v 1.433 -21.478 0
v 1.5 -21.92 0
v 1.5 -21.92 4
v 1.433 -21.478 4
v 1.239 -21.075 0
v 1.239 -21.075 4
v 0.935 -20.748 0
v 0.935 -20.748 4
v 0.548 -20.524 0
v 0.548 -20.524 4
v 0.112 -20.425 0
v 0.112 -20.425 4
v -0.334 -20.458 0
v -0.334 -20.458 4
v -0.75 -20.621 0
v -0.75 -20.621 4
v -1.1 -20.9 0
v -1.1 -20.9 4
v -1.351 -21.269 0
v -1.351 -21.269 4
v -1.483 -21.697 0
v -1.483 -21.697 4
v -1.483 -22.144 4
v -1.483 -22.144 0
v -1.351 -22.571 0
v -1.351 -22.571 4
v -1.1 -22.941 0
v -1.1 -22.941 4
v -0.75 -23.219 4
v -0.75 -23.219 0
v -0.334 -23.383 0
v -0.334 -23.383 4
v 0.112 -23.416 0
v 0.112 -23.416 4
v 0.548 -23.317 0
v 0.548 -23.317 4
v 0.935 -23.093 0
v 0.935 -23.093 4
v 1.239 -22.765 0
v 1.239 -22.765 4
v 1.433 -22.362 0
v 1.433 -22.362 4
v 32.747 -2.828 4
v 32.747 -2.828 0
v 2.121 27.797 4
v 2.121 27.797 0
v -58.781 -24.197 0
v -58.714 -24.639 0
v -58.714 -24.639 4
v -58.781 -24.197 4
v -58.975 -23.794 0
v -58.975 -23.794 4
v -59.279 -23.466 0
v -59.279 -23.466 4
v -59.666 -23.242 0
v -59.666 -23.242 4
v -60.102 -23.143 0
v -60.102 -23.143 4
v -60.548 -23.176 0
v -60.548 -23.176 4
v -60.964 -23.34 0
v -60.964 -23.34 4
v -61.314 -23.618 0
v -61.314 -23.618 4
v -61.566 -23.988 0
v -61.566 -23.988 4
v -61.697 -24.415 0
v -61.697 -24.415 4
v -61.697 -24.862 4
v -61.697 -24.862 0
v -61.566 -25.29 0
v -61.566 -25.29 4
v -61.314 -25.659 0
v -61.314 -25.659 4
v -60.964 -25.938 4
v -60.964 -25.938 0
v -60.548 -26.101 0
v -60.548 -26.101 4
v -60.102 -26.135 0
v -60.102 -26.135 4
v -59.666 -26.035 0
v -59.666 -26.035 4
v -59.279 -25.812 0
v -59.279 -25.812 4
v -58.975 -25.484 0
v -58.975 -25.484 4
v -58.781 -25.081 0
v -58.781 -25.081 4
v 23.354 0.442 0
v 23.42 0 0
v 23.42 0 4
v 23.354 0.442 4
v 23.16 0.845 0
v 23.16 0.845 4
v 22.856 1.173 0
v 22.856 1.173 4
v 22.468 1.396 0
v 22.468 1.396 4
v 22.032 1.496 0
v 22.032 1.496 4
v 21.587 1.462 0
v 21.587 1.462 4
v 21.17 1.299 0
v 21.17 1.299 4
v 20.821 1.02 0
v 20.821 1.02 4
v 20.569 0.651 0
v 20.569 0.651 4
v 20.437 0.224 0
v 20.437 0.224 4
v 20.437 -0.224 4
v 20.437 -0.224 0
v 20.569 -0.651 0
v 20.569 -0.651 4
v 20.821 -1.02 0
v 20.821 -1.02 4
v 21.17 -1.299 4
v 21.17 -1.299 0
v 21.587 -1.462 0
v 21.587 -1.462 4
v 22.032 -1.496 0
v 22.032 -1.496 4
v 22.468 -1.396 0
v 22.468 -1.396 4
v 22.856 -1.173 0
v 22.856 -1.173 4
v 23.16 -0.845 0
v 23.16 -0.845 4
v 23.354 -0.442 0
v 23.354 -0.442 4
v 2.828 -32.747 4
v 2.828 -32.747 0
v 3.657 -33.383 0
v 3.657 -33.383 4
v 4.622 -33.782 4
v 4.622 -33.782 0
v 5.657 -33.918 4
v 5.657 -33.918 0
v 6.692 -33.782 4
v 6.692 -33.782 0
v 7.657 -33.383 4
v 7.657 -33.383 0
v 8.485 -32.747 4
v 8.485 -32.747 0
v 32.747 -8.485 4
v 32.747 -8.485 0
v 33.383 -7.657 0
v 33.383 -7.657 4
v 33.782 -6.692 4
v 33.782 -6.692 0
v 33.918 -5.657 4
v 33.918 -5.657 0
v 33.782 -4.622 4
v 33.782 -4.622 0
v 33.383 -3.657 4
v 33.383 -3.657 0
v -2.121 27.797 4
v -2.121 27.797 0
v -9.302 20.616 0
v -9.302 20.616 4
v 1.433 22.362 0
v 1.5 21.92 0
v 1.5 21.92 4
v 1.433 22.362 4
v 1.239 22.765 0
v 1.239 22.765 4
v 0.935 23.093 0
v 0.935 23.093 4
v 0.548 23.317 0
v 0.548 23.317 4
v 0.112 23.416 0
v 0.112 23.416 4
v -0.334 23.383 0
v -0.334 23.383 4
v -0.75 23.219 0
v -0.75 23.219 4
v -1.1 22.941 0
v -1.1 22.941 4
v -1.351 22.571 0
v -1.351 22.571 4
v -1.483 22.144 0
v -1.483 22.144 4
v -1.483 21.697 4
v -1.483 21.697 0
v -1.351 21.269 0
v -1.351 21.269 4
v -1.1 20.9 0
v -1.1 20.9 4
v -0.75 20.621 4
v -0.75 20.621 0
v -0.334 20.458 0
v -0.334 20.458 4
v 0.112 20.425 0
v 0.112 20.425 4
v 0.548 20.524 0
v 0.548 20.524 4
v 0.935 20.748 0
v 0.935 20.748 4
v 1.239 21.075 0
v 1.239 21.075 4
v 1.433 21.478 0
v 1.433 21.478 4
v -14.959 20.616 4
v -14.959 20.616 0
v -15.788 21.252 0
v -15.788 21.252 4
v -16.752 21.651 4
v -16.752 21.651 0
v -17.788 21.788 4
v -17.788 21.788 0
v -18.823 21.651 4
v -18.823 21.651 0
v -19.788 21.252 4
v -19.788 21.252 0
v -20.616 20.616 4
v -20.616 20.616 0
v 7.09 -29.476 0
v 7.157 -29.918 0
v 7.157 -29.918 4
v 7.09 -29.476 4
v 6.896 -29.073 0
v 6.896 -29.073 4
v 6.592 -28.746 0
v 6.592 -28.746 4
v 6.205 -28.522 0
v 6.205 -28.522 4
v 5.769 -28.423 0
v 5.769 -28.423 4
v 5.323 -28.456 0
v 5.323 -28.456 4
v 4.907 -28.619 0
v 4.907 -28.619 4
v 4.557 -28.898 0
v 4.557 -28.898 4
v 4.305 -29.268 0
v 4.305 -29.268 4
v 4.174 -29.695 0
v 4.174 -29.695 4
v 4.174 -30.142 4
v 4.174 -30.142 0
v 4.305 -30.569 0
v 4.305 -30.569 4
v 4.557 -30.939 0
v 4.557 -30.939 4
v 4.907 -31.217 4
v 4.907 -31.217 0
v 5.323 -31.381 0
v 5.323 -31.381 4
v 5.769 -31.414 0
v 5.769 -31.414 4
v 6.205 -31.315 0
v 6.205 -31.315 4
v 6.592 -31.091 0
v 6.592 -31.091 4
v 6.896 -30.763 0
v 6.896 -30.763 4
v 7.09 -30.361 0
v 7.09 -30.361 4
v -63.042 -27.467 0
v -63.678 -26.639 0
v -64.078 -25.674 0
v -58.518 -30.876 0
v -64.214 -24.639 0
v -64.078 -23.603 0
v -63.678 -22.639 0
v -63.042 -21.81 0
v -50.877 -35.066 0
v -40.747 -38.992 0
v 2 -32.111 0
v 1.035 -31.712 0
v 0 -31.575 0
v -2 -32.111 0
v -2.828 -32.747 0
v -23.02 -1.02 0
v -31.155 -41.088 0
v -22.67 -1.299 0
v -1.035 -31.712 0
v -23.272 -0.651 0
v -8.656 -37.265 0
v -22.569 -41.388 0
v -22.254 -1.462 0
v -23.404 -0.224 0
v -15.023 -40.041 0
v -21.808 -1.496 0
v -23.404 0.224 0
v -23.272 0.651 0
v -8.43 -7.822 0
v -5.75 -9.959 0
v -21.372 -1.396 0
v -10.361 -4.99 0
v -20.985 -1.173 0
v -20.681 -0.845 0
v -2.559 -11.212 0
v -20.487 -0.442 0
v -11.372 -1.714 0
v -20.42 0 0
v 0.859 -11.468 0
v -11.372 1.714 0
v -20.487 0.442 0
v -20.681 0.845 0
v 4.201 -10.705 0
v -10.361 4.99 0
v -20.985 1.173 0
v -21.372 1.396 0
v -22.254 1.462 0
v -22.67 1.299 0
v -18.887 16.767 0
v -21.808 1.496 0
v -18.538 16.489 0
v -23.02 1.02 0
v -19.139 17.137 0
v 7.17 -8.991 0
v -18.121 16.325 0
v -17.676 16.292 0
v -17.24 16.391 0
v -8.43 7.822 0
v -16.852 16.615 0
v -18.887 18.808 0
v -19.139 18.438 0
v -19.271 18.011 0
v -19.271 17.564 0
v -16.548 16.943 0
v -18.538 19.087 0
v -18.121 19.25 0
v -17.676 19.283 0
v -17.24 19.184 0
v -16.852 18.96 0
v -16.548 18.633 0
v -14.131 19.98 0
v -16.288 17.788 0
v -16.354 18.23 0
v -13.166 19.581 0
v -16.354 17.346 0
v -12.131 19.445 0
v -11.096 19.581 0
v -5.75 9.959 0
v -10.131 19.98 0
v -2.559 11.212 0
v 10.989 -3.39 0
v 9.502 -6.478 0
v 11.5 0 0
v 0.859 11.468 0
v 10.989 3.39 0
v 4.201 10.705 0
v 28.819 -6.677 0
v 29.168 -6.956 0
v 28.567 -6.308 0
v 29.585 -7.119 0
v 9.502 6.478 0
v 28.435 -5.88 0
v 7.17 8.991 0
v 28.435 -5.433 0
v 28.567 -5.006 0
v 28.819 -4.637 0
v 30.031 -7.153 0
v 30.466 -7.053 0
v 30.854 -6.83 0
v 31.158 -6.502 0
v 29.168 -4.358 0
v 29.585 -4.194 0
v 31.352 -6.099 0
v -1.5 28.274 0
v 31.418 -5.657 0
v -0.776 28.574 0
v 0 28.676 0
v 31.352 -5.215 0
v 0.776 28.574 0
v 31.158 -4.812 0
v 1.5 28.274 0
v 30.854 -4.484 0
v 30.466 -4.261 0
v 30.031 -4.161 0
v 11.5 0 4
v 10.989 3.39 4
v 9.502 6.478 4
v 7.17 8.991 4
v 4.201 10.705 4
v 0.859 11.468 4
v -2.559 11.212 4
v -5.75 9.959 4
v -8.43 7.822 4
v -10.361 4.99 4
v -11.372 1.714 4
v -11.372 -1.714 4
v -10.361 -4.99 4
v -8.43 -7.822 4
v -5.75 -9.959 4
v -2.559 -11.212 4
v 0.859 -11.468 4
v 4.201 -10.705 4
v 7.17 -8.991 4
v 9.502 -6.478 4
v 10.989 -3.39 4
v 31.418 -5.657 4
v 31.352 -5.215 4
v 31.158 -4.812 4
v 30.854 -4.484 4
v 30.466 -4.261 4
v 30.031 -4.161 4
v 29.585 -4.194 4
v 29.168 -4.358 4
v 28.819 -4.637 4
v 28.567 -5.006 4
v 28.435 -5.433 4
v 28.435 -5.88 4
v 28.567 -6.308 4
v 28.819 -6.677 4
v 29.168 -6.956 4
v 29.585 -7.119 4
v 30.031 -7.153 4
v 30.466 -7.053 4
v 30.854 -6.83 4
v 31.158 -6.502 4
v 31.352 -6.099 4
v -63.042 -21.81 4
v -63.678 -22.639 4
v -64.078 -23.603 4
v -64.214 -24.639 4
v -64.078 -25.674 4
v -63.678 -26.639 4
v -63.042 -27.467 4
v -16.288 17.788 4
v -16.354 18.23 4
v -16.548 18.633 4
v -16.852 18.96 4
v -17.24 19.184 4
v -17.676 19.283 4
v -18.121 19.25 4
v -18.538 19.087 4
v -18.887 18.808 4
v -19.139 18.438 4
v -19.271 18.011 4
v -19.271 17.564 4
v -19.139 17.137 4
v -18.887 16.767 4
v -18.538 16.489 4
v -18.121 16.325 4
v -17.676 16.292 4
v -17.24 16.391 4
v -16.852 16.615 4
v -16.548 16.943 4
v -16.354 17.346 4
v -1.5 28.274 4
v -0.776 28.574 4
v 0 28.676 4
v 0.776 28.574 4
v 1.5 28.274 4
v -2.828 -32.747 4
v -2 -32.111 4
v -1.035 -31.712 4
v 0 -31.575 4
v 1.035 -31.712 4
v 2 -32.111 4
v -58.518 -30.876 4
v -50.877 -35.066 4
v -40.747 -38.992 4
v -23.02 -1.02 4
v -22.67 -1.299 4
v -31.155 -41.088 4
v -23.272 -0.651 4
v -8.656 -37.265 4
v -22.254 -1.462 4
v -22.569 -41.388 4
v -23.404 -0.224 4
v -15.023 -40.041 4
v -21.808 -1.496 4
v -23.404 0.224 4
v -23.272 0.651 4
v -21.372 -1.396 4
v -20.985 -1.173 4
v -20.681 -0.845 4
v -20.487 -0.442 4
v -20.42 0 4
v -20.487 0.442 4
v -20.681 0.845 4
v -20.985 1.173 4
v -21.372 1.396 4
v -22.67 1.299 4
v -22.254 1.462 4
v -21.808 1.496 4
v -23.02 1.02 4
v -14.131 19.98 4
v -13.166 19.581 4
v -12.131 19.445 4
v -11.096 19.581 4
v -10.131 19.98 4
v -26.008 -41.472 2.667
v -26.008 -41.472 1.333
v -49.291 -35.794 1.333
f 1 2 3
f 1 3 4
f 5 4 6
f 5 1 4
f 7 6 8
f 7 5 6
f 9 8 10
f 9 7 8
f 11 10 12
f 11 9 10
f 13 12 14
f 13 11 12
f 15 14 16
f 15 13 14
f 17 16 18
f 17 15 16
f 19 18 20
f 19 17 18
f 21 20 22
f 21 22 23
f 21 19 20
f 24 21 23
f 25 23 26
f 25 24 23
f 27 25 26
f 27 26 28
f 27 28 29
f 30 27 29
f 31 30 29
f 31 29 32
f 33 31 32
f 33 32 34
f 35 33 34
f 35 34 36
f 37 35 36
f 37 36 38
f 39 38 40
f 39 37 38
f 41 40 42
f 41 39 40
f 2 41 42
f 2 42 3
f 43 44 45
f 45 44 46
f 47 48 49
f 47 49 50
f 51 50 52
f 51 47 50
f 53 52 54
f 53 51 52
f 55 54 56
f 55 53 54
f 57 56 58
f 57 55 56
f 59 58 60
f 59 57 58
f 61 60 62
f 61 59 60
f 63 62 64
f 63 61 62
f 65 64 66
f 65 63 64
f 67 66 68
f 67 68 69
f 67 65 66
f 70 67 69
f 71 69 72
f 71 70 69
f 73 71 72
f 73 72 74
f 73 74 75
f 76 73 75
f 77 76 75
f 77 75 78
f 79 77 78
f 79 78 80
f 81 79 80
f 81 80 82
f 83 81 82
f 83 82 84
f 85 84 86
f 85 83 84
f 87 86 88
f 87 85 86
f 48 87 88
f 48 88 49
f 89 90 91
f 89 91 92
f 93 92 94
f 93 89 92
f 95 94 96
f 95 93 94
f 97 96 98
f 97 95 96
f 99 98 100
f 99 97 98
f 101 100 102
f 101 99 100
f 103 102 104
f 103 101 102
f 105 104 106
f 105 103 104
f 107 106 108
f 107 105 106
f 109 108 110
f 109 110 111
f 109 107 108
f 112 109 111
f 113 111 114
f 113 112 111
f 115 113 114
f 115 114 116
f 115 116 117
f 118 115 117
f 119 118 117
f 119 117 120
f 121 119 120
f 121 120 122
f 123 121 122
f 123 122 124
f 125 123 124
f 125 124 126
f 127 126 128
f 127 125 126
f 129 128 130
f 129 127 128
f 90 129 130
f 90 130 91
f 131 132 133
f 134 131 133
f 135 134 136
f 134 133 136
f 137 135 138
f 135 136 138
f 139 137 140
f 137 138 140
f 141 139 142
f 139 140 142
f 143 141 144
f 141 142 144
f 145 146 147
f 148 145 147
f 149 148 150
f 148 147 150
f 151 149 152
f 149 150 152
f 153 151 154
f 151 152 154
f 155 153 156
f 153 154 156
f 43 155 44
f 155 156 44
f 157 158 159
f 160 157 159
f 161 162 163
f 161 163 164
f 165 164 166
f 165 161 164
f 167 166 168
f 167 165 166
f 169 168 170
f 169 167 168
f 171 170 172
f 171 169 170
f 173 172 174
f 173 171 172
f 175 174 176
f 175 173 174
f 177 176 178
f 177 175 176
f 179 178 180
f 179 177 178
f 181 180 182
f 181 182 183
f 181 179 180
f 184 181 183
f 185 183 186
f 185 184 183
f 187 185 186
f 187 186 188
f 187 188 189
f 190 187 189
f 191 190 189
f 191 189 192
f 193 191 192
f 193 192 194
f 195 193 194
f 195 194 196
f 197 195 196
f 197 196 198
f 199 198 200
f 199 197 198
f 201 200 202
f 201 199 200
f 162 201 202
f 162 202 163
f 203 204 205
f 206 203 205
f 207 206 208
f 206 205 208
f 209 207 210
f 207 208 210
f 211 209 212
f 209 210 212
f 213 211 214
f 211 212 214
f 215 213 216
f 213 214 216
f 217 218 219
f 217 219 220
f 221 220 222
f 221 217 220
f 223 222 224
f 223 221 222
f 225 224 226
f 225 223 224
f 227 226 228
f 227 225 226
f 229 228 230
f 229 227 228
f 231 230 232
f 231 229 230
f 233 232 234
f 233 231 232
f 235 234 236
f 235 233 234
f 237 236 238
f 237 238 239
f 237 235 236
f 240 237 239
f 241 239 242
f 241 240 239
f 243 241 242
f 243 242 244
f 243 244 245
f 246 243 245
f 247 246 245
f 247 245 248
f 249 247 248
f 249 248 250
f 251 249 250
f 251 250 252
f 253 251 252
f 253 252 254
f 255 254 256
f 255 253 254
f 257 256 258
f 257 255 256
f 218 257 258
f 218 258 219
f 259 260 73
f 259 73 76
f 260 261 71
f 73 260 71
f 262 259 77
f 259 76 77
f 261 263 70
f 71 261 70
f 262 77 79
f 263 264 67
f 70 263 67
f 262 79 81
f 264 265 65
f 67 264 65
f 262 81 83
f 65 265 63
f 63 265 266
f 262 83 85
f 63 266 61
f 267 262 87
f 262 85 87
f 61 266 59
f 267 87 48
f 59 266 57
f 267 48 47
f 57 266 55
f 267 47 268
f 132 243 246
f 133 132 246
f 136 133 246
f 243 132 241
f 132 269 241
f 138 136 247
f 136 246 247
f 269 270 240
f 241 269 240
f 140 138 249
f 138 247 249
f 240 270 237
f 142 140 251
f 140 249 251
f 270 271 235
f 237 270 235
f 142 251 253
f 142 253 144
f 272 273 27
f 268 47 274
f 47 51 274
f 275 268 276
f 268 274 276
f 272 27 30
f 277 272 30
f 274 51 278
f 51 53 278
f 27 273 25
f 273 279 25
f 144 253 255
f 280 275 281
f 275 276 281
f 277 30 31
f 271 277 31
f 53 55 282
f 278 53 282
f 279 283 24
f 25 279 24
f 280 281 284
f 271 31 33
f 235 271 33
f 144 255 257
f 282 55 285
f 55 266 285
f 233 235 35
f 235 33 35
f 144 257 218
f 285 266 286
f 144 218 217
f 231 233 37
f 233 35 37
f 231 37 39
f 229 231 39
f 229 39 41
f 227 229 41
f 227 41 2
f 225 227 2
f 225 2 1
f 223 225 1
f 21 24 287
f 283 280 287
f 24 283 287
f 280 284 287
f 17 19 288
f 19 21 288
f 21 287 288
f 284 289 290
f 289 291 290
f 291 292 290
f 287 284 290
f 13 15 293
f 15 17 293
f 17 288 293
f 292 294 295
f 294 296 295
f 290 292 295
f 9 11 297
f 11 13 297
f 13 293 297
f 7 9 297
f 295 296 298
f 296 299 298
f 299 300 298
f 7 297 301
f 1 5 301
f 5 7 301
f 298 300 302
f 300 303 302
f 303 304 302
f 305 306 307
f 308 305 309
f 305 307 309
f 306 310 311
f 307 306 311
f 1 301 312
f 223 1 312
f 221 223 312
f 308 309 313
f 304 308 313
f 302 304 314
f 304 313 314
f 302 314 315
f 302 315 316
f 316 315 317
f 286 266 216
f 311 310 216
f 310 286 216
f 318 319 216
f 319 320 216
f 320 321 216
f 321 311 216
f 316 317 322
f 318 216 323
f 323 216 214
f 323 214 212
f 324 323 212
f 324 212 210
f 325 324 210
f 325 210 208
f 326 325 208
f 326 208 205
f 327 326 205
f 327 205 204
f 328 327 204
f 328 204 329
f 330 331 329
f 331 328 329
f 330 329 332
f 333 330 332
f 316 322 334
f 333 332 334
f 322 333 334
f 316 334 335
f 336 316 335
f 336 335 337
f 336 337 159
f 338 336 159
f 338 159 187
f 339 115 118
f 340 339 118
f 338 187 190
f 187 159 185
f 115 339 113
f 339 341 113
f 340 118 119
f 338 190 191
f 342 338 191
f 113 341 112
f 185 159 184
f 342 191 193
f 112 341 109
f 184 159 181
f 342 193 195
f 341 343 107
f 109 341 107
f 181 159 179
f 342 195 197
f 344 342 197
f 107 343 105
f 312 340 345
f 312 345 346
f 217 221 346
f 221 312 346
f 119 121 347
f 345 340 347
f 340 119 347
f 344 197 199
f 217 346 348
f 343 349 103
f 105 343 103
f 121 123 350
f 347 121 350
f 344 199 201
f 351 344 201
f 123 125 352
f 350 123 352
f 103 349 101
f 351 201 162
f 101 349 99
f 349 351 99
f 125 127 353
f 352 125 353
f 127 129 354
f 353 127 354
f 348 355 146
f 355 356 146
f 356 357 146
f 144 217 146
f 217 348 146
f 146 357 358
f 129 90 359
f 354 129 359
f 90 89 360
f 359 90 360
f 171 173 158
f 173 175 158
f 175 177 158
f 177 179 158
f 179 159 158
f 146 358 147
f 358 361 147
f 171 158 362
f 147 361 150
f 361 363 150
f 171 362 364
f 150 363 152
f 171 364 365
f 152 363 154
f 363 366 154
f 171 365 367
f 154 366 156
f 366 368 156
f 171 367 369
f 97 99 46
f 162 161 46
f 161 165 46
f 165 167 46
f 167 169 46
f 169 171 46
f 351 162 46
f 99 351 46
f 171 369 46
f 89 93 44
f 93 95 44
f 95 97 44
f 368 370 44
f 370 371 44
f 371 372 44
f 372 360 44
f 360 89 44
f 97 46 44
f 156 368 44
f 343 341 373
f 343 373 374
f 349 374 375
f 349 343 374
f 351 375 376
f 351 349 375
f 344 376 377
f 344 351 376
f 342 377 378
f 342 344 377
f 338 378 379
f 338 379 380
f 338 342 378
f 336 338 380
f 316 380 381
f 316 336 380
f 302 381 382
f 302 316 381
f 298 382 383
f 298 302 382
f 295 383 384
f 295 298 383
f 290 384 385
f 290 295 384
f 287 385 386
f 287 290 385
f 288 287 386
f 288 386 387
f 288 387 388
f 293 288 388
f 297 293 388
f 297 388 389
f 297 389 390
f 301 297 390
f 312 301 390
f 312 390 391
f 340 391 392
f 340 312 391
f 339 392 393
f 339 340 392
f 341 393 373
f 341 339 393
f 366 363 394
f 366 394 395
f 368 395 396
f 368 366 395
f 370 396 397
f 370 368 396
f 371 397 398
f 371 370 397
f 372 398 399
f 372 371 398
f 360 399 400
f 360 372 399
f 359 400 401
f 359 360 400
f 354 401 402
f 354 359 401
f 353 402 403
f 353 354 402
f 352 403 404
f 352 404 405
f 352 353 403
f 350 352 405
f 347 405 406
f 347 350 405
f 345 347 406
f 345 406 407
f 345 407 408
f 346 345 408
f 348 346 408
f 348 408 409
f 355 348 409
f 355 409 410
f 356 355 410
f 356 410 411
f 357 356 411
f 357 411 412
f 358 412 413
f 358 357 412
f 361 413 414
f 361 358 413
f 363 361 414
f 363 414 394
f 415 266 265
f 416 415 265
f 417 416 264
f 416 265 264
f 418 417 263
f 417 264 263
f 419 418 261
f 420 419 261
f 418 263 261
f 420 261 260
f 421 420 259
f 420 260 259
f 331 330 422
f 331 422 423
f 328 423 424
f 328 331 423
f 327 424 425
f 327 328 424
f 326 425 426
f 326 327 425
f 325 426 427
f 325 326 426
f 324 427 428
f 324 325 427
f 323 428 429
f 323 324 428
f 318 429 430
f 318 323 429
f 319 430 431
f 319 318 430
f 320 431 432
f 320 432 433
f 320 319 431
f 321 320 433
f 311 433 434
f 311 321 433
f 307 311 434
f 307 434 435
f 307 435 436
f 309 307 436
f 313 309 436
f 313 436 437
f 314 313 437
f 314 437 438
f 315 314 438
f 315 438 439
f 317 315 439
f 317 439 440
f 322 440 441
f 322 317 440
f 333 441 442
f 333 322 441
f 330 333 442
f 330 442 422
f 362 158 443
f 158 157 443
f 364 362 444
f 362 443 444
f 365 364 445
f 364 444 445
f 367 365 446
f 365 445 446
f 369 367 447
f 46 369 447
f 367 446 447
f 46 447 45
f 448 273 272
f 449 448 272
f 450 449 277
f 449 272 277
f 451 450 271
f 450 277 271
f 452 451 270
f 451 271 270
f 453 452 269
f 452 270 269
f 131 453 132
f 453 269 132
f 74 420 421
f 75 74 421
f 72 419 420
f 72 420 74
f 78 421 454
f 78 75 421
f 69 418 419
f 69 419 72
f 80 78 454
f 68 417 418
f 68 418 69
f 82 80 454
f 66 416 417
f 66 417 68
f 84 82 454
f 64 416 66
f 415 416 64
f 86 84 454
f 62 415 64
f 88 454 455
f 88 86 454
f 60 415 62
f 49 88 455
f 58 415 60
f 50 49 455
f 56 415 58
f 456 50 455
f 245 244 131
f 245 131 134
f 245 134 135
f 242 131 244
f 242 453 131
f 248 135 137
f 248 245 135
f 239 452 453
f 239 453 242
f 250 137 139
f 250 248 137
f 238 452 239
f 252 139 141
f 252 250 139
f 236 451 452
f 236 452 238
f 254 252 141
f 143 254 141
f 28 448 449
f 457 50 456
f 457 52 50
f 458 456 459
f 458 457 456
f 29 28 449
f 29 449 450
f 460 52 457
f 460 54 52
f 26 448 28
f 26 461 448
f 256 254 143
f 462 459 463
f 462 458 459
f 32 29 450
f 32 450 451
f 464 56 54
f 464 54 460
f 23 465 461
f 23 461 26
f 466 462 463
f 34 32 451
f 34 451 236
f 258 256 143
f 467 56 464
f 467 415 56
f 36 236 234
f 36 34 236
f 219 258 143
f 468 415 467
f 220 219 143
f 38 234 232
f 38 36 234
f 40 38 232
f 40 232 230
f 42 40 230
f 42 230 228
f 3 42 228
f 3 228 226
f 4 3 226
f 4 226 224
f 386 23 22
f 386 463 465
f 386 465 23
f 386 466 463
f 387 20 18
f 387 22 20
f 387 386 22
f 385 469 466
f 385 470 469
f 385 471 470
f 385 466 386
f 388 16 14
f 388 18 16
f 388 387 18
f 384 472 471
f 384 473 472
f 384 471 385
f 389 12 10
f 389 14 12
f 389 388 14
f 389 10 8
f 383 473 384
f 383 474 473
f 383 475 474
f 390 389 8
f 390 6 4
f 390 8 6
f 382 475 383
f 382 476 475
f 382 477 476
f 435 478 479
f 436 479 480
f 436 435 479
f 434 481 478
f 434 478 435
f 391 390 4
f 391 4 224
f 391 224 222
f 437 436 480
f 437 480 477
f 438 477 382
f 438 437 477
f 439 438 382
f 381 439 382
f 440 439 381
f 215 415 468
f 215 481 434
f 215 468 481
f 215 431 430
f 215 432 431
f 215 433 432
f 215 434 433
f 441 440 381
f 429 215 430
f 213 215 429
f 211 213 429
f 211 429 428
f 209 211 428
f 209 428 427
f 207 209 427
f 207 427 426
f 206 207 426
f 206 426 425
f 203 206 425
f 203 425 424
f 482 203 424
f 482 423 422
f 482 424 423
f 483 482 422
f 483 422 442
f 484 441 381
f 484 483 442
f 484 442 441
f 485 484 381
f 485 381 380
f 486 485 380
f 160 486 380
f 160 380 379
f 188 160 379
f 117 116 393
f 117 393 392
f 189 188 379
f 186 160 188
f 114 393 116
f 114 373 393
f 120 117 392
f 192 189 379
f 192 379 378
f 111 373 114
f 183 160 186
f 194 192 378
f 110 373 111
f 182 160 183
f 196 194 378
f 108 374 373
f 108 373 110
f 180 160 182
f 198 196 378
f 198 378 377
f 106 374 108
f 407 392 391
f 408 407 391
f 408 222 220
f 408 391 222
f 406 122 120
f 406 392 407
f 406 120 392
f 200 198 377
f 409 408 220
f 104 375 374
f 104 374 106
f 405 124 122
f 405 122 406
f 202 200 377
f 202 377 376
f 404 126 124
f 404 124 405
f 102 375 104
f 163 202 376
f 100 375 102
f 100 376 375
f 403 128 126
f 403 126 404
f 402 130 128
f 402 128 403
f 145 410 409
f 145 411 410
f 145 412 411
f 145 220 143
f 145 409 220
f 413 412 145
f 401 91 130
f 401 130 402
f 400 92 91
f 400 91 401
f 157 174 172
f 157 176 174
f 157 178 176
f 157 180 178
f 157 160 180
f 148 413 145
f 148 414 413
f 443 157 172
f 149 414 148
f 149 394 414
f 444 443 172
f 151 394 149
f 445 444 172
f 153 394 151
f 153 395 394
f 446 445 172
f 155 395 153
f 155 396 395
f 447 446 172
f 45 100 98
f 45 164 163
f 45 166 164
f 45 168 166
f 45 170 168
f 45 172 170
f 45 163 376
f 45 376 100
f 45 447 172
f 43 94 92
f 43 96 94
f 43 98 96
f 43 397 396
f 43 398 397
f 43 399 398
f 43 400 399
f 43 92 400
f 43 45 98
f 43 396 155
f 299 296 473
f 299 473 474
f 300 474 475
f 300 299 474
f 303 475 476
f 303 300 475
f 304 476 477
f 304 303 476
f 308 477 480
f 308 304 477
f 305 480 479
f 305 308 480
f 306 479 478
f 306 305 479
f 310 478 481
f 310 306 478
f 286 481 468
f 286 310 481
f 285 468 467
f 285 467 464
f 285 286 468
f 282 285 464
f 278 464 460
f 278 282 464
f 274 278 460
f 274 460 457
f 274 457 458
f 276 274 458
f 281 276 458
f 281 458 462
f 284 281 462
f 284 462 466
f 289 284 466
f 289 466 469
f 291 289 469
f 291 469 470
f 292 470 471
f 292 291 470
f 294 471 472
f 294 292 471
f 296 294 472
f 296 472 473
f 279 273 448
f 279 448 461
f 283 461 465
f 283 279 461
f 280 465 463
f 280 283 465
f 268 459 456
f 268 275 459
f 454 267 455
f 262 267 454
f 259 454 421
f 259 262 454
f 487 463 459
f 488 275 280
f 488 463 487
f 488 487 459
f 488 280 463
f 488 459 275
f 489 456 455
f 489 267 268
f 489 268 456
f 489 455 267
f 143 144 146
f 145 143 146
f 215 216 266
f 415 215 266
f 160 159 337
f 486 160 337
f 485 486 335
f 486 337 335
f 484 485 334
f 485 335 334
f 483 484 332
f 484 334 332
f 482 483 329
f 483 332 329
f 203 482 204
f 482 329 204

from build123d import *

# Parameters (mm, degrees)
SKETCH1_R           = 1.5
SKETCH1_R_2         = 11.5
BOSS_EXTRUDE1_DEPTH = 4
FILLET1_R           = 3


with BuildPart() as part:
    # Sketch1 → Boss-Extrude1 (new body)
    with BuildSketch(Plane.XY):
        with BuildLine():
            Line((-20.616075737, 20.616075737), (-63.042482608, -21.810331134))
            ThreePointArc((-63.042482608, -21.810331134), (-64.214055483, -24.638758259), (-63.042482608, -27.467185384))
            add(Edge.make_bspline(
                [(-2.828427125, -32.7468701), (-22.744659396, -52.590484488), (-57.268164388, -33.201805253), (-63.042482608, -27.467185384)],
                knots=[0, 0, 0, 0, 1, 1, 1, 1], degree=3))
            ThreePointArc((-2.828427125, -32.7468701), (0, -31.575297224), (2.828427125, -32.7468701))
            ThreePointArc((2.828427125, -32.7468701), (5.656854249, -33.918442975), (8.485281374, -32.7468701))
            Line((8.485281374, -32.7468701), (32.7468701, -8.485281374))
            ThreePointArc((32.7468701, -8.485281374), (33.918442975, -5.656854249), (32.7468701, -2.828427125))
            Line((32.7468701, -2.828427125), (0, 29.918442975))
            Line((0, 29.918442975), (-9.302367238, 20.616075737))
            ThreePointArc((-9.302367238, 20.616075737), (-12.130794363, 19.444502862), (-14.959221487, 20.616075737))
            ThreePointArc((-14.959221487, 20.616075737), (-17.787648612, 21.787648612), (-20.616075737, 20.616075737))
        make_face()
        with Locations((29.918442975, -5.656854249)):
            Circle(SKETCH1_R, mode=Mode.SUBTRACT)
        with Locations((-21.920310217, 0)):
            Circle(SKETCH1_R, mode=Mode.SUBTRACT)
        with Locations((0, 21.920310217)):
            Circle(SKETCH1_R, mode=Mode.SUBTRACT)
        with Locations((21.920310217, 0)):
            Circle(SKETCH1_R, mode=Mode.SUBTRACT)
        Circle(SKETCH1_R_2, mode=Mode.SUBTRACT)
        with Locations((0, -21.920310217)):
            Circle(SKETCH1_R, mode=Mode.SUBTRACT)
        with Locations((5.656854249, -29.918442975)):
            Circle(SKETCH1_R, mode=Mode.SUBTRACT)
        with Locations((-17.787648612, 17.787648612)):
            Circle(SKETCH1_R, mode=Mode.SUBTRACT)
        with Locations((-60.214055483, -24.638758259)):
            Circle(SKETCH1_R, mode=Mode.SUBTRACT)
    extrude(amount=BOSS_EXTRUDE1_DEPTH)

    # Fillet1
    fillet1_edges = [part.edges().sort_by_distance(p)[0] for p in [
        (0, 29.918442975, 2),
    ]]
    fillet(fillet1_edges, radius=FILLET1_R)


solid = part.part
